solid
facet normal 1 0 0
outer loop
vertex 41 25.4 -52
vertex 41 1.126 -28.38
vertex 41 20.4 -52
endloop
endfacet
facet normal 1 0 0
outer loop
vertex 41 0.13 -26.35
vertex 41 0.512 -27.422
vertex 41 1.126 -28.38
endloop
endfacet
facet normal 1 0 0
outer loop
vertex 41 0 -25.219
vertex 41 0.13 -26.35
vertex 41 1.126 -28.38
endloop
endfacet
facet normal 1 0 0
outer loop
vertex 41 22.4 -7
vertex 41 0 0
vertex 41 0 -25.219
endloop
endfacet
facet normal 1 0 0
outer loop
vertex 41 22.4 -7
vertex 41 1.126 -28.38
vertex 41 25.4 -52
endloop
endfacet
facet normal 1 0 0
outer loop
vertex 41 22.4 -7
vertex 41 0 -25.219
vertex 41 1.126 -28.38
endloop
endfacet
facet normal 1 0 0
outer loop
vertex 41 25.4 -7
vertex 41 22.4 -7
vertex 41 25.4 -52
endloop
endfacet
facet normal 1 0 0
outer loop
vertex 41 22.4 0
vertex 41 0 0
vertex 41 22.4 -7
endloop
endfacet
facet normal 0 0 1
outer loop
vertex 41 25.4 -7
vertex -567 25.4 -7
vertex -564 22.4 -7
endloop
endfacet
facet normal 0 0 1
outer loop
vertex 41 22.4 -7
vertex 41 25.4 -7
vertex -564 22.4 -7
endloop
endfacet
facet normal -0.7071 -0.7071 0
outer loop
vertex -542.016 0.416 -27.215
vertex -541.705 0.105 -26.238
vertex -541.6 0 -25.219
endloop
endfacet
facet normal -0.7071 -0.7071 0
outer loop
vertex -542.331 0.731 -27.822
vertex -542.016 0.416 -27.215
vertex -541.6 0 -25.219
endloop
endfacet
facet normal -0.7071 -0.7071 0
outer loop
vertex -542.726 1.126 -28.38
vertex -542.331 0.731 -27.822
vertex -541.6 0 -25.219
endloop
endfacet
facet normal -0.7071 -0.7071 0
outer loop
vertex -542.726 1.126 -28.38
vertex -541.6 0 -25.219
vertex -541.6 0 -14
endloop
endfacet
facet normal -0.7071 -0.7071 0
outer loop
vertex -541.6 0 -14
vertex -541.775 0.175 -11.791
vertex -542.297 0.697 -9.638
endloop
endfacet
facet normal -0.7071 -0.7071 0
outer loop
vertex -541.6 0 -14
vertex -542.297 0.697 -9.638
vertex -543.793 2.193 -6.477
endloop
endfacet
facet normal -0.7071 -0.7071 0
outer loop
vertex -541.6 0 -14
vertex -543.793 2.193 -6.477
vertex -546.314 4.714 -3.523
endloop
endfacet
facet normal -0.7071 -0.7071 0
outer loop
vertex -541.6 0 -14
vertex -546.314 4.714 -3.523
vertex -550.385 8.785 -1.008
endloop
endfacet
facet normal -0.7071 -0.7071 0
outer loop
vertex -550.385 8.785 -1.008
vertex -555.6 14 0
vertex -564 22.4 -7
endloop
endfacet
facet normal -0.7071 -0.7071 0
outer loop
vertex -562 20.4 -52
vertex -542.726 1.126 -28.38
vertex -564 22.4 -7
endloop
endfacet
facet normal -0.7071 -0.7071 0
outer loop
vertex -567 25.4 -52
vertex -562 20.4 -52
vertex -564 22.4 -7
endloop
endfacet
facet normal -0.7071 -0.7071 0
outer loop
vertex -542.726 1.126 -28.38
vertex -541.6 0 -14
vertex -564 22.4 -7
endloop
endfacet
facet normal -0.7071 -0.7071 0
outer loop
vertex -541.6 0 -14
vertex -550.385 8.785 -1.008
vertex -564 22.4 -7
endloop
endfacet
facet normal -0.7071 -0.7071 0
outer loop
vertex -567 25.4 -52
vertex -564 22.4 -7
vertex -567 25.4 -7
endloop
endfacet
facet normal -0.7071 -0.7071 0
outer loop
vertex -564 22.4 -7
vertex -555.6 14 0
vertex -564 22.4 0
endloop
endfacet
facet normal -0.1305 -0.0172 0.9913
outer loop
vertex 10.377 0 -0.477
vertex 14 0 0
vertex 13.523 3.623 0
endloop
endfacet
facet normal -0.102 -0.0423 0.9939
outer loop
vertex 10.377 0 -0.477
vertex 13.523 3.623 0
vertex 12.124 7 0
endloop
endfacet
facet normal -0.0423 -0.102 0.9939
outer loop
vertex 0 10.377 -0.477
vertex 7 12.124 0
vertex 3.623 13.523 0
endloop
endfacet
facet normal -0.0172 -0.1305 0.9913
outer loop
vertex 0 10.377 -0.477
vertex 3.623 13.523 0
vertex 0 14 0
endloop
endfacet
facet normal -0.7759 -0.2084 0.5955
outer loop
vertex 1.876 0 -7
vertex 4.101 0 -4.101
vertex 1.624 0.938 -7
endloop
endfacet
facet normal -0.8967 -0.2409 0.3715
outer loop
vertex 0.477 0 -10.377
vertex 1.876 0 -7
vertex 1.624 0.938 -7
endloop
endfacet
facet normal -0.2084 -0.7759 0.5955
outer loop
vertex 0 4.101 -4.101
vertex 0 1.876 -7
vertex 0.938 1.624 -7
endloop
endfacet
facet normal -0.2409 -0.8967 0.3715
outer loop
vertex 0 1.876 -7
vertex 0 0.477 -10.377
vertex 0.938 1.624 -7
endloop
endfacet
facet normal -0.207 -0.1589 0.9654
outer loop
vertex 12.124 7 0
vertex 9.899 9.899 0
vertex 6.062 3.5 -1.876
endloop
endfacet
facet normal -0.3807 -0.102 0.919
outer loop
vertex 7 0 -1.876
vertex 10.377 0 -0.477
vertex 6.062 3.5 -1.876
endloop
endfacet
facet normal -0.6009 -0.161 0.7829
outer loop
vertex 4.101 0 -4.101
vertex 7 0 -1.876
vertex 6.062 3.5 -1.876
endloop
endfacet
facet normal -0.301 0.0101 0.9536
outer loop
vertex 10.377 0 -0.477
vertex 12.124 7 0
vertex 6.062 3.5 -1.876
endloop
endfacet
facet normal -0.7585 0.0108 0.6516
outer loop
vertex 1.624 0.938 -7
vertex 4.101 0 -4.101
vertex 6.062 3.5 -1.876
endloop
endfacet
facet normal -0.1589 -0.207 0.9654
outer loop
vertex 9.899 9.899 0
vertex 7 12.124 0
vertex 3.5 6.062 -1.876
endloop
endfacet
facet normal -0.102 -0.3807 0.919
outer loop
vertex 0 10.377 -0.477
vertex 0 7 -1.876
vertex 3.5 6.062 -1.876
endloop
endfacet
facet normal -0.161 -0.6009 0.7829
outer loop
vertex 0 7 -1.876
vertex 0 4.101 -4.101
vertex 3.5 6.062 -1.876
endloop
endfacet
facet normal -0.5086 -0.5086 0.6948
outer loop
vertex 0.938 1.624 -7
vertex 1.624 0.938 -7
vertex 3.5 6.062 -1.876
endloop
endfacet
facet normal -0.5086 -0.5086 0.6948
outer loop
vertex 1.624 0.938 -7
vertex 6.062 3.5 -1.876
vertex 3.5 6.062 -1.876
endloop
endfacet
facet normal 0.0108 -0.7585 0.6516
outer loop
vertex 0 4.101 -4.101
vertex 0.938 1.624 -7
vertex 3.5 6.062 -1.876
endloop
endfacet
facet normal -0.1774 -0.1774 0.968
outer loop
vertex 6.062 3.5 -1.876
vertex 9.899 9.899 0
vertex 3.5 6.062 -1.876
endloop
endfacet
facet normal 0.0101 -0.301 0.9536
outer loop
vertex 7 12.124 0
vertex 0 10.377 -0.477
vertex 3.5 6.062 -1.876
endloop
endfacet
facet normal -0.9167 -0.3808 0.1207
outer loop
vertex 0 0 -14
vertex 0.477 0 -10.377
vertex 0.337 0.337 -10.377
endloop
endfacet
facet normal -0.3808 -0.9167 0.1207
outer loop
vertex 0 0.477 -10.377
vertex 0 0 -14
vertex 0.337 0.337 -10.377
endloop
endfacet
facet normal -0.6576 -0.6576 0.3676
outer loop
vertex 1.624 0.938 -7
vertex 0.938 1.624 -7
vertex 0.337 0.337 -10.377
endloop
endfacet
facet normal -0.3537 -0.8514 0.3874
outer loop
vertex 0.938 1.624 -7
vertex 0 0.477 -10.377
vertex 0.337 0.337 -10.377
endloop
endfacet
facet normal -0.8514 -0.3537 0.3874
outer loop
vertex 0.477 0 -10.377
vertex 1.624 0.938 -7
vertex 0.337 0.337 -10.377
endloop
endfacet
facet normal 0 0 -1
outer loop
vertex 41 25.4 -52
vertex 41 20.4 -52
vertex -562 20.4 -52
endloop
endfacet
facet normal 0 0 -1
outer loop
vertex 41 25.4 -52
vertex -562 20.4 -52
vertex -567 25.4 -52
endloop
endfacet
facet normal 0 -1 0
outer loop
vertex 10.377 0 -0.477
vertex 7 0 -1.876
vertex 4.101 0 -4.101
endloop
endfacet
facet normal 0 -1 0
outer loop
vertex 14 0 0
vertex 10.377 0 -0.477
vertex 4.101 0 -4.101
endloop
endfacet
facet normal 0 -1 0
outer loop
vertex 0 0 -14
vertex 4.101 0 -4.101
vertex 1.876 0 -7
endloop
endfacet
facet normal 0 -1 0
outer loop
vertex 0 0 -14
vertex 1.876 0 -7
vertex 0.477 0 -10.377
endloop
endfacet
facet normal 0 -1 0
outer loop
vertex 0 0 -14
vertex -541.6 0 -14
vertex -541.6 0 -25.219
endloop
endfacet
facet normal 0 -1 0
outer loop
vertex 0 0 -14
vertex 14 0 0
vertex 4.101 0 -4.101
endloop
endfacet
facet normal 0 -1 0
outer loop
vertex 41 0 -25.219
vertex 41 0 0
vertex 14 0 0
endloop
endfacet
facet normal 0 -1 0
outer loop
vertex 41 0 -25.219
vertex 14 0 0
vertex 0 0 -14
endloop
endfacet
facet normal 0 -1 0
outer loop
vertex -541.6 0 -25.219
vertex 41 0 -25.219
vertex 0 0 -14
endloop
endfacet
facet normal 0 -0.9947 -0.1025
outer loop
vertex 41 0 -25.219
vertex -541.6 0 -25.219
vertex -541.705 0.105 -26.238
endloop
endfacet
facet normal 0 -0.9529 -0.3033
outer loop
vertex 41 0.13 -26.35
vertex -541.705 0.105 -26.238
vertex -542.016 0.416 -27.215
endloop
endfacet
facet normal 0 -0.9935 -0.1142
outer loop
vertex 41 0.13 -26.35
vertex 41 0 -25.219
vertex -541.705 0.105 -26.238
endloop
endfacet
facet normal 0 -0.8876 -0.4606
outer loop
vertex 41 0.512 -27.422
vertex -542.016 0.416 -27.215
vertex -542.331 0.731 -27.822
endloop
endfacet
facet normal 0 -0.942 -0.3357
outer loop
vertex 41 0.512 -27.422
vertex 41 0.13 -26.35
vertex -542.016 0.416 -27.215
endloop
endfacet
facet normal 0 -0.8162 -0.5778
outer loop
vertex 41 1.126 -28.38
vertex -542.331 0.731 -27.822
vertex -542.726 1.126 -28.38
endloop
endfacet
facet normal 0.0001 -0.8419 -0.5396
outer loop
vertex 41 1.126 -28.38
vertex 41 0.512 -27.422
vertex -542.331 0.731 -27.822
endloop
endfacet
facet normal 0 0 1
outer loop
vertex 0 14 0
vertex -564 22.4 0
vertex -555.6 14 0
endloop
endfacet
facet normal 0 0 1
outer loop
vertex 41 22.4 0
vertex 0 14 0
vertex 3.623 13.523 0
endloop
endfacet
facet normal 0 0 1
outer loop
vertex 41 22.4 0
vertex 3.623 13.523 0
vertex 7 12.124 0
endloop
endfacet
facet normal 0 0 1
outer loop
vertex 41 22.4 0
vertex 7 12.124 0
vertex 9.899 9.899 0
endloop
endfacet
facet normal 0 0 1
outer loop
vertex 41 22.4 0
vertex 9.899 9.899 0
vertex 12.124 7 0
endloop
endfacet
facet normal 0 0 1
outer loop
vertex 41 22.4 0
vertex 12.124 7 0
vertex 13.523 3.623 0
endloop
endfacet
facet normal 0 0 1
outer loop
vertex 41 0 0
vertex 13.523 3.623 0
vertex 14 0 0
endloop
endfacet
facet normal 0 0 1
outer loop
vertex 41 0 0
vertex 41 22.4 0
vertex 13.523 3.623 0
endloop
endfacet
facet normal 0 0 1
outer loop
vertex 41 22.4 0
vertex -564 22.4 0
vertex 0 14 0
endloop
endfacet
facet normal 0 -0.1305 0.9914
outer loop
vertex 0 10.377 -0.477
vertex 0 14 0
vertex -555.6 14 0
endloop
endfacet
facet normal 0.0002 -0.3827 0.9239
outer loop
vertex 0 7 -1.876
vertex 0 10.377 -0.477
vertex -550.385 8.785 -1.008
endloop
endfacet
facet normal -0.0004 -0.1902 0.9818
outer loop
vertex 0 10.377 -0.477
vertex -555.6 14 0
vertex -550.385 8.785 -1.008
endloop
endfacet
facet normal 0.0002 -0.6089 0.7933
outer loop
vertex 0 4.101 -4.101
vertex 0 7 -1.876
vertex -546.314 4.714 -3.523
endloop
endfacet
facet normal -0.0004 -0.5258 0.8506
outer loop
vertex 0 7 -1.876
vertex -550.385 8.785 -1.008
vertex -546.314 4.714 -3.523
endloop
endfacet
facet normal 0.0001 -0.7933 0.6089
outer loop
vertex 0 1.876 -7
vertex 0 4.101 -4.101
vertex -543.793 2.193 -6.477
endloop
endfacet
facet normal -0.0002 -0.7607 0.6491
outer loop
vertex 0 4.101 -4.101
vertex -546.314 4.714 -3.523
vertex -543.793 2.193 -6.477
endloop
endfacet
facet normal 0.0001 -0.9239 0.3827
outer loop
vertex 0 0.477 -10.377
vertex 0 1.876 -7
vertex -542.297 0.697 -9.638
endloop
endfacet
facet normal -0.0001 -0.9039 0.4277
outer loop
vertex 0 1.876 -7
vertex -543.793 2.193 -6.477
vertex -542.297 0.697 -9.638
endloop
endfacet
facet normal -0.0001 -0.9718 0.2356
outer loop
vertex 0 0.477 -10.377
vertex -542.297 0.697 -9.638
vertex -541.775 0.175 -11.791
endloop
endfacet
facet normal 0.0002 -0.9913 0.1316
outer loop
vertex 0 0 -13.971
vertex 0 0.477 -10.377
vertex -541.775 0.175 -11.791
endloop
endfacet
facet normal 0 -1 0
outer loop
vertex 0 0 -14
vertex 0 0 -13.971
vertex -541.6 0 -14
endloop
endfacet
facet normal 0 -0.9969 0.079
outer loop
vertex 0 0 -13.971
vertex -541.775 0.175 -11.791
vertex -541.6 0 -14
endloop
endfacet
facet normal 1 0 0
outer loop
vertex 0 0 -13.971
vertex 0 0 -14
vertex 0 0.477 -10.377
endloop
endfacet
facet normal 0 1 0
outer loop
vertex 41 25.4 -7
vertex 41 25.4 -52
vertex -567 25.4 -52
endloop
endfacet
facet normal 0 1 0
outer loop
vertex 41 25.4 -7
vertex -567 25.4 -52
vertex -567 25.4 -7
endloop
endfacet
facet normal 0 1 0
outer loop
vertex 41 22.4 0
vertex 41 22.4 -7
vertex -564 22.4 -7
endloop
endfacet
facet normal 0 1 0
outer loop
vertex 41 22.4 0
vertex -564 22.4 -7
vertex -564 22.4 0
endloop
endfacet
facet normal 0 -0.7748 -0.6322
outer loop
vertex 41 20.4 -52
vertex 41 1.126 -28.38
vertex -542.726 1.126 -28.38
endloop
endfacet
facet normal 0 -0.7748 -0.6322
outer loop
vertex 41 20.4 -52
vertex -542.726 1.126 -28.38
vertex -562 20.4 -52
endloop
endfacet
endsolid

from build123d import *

# Parameters (mm, degrees)
F1_DEPTH      = 41
F1_DEPTH_BACK = 824
F5_DEPTH      = 824
F6_R          = 5
F8_DEPTH      = 52.001


with BuildPart() as f1:
    # F0 (on Right) → F1 (new body, two sides)
    with BuildSketch(Plane.YZ) as f1_sk:
        Polygon((22.4, 0), (0, 0), (0, -27), (20.4, -52), (25.4, -52), (25.4, -7), (22.4, -7), align=None)
    extrude(amount=F1_DEPTH)
    extrude(f1_sk.sketch, amount=-F1_DEPTH_BACK)

    # F2 (on Right) → F3 (revolve, cut)
    with BuildSketch(Plane.YZ):
        with BuildLine():
            ThreePointArc((0, -14), (4.100505, -4.100505), (14, 0))
            Line((14, 0), (14, 13.538237))
            Line((14, 13.538237), (0, 13.538237))
            Line((0, 13.538237), (0, -14))
        make_face()
    revolve(axis=Axis((0, 0, -0.230882), (0, 0, 1)), mode=Mode.SUBTRACT)

    # F4 (on face) → F5 (cut, through all)
    with BuildSketch(Plane(origin=(-824, 0, 0), x_dir=(0, -1, 0), z_dir=(-1, 0, 0))):
        with BuildLine():
            Line((-14, 13.538237), (-14, 0))
            ThreePointArc((-14, 0), (-4.100505, -4.100505), (0, -14))
            Line((0, -14), (0, 13.538237))
            Line((0, 13.538237), (-14, 13.538237))
        make_face()
    extrude(amount=-F5_DEPTH, mode=Mode.SUBTRACT)

    # F6
    f6_edges = [f1.edges().sort_by_distance(p)[0] for p in [
        (-391.5, 0, -27),
    ]]
    fillet(f6_edges, radius=F6_R)

    # F7 (on face) → F8 (cut, through all)
    with BuildSketch(Plane.XY):
        Polygon((-520.652341, -20.947659), (-567, 25.4), (-818.416774, 72.289795), (-858.546881, 112.419901), (-858.546881, -20.947659), align=None)
    extrude(amount=-F8_DEPTH, mode=Mode.SUBTRACT)


solid = f1.part
